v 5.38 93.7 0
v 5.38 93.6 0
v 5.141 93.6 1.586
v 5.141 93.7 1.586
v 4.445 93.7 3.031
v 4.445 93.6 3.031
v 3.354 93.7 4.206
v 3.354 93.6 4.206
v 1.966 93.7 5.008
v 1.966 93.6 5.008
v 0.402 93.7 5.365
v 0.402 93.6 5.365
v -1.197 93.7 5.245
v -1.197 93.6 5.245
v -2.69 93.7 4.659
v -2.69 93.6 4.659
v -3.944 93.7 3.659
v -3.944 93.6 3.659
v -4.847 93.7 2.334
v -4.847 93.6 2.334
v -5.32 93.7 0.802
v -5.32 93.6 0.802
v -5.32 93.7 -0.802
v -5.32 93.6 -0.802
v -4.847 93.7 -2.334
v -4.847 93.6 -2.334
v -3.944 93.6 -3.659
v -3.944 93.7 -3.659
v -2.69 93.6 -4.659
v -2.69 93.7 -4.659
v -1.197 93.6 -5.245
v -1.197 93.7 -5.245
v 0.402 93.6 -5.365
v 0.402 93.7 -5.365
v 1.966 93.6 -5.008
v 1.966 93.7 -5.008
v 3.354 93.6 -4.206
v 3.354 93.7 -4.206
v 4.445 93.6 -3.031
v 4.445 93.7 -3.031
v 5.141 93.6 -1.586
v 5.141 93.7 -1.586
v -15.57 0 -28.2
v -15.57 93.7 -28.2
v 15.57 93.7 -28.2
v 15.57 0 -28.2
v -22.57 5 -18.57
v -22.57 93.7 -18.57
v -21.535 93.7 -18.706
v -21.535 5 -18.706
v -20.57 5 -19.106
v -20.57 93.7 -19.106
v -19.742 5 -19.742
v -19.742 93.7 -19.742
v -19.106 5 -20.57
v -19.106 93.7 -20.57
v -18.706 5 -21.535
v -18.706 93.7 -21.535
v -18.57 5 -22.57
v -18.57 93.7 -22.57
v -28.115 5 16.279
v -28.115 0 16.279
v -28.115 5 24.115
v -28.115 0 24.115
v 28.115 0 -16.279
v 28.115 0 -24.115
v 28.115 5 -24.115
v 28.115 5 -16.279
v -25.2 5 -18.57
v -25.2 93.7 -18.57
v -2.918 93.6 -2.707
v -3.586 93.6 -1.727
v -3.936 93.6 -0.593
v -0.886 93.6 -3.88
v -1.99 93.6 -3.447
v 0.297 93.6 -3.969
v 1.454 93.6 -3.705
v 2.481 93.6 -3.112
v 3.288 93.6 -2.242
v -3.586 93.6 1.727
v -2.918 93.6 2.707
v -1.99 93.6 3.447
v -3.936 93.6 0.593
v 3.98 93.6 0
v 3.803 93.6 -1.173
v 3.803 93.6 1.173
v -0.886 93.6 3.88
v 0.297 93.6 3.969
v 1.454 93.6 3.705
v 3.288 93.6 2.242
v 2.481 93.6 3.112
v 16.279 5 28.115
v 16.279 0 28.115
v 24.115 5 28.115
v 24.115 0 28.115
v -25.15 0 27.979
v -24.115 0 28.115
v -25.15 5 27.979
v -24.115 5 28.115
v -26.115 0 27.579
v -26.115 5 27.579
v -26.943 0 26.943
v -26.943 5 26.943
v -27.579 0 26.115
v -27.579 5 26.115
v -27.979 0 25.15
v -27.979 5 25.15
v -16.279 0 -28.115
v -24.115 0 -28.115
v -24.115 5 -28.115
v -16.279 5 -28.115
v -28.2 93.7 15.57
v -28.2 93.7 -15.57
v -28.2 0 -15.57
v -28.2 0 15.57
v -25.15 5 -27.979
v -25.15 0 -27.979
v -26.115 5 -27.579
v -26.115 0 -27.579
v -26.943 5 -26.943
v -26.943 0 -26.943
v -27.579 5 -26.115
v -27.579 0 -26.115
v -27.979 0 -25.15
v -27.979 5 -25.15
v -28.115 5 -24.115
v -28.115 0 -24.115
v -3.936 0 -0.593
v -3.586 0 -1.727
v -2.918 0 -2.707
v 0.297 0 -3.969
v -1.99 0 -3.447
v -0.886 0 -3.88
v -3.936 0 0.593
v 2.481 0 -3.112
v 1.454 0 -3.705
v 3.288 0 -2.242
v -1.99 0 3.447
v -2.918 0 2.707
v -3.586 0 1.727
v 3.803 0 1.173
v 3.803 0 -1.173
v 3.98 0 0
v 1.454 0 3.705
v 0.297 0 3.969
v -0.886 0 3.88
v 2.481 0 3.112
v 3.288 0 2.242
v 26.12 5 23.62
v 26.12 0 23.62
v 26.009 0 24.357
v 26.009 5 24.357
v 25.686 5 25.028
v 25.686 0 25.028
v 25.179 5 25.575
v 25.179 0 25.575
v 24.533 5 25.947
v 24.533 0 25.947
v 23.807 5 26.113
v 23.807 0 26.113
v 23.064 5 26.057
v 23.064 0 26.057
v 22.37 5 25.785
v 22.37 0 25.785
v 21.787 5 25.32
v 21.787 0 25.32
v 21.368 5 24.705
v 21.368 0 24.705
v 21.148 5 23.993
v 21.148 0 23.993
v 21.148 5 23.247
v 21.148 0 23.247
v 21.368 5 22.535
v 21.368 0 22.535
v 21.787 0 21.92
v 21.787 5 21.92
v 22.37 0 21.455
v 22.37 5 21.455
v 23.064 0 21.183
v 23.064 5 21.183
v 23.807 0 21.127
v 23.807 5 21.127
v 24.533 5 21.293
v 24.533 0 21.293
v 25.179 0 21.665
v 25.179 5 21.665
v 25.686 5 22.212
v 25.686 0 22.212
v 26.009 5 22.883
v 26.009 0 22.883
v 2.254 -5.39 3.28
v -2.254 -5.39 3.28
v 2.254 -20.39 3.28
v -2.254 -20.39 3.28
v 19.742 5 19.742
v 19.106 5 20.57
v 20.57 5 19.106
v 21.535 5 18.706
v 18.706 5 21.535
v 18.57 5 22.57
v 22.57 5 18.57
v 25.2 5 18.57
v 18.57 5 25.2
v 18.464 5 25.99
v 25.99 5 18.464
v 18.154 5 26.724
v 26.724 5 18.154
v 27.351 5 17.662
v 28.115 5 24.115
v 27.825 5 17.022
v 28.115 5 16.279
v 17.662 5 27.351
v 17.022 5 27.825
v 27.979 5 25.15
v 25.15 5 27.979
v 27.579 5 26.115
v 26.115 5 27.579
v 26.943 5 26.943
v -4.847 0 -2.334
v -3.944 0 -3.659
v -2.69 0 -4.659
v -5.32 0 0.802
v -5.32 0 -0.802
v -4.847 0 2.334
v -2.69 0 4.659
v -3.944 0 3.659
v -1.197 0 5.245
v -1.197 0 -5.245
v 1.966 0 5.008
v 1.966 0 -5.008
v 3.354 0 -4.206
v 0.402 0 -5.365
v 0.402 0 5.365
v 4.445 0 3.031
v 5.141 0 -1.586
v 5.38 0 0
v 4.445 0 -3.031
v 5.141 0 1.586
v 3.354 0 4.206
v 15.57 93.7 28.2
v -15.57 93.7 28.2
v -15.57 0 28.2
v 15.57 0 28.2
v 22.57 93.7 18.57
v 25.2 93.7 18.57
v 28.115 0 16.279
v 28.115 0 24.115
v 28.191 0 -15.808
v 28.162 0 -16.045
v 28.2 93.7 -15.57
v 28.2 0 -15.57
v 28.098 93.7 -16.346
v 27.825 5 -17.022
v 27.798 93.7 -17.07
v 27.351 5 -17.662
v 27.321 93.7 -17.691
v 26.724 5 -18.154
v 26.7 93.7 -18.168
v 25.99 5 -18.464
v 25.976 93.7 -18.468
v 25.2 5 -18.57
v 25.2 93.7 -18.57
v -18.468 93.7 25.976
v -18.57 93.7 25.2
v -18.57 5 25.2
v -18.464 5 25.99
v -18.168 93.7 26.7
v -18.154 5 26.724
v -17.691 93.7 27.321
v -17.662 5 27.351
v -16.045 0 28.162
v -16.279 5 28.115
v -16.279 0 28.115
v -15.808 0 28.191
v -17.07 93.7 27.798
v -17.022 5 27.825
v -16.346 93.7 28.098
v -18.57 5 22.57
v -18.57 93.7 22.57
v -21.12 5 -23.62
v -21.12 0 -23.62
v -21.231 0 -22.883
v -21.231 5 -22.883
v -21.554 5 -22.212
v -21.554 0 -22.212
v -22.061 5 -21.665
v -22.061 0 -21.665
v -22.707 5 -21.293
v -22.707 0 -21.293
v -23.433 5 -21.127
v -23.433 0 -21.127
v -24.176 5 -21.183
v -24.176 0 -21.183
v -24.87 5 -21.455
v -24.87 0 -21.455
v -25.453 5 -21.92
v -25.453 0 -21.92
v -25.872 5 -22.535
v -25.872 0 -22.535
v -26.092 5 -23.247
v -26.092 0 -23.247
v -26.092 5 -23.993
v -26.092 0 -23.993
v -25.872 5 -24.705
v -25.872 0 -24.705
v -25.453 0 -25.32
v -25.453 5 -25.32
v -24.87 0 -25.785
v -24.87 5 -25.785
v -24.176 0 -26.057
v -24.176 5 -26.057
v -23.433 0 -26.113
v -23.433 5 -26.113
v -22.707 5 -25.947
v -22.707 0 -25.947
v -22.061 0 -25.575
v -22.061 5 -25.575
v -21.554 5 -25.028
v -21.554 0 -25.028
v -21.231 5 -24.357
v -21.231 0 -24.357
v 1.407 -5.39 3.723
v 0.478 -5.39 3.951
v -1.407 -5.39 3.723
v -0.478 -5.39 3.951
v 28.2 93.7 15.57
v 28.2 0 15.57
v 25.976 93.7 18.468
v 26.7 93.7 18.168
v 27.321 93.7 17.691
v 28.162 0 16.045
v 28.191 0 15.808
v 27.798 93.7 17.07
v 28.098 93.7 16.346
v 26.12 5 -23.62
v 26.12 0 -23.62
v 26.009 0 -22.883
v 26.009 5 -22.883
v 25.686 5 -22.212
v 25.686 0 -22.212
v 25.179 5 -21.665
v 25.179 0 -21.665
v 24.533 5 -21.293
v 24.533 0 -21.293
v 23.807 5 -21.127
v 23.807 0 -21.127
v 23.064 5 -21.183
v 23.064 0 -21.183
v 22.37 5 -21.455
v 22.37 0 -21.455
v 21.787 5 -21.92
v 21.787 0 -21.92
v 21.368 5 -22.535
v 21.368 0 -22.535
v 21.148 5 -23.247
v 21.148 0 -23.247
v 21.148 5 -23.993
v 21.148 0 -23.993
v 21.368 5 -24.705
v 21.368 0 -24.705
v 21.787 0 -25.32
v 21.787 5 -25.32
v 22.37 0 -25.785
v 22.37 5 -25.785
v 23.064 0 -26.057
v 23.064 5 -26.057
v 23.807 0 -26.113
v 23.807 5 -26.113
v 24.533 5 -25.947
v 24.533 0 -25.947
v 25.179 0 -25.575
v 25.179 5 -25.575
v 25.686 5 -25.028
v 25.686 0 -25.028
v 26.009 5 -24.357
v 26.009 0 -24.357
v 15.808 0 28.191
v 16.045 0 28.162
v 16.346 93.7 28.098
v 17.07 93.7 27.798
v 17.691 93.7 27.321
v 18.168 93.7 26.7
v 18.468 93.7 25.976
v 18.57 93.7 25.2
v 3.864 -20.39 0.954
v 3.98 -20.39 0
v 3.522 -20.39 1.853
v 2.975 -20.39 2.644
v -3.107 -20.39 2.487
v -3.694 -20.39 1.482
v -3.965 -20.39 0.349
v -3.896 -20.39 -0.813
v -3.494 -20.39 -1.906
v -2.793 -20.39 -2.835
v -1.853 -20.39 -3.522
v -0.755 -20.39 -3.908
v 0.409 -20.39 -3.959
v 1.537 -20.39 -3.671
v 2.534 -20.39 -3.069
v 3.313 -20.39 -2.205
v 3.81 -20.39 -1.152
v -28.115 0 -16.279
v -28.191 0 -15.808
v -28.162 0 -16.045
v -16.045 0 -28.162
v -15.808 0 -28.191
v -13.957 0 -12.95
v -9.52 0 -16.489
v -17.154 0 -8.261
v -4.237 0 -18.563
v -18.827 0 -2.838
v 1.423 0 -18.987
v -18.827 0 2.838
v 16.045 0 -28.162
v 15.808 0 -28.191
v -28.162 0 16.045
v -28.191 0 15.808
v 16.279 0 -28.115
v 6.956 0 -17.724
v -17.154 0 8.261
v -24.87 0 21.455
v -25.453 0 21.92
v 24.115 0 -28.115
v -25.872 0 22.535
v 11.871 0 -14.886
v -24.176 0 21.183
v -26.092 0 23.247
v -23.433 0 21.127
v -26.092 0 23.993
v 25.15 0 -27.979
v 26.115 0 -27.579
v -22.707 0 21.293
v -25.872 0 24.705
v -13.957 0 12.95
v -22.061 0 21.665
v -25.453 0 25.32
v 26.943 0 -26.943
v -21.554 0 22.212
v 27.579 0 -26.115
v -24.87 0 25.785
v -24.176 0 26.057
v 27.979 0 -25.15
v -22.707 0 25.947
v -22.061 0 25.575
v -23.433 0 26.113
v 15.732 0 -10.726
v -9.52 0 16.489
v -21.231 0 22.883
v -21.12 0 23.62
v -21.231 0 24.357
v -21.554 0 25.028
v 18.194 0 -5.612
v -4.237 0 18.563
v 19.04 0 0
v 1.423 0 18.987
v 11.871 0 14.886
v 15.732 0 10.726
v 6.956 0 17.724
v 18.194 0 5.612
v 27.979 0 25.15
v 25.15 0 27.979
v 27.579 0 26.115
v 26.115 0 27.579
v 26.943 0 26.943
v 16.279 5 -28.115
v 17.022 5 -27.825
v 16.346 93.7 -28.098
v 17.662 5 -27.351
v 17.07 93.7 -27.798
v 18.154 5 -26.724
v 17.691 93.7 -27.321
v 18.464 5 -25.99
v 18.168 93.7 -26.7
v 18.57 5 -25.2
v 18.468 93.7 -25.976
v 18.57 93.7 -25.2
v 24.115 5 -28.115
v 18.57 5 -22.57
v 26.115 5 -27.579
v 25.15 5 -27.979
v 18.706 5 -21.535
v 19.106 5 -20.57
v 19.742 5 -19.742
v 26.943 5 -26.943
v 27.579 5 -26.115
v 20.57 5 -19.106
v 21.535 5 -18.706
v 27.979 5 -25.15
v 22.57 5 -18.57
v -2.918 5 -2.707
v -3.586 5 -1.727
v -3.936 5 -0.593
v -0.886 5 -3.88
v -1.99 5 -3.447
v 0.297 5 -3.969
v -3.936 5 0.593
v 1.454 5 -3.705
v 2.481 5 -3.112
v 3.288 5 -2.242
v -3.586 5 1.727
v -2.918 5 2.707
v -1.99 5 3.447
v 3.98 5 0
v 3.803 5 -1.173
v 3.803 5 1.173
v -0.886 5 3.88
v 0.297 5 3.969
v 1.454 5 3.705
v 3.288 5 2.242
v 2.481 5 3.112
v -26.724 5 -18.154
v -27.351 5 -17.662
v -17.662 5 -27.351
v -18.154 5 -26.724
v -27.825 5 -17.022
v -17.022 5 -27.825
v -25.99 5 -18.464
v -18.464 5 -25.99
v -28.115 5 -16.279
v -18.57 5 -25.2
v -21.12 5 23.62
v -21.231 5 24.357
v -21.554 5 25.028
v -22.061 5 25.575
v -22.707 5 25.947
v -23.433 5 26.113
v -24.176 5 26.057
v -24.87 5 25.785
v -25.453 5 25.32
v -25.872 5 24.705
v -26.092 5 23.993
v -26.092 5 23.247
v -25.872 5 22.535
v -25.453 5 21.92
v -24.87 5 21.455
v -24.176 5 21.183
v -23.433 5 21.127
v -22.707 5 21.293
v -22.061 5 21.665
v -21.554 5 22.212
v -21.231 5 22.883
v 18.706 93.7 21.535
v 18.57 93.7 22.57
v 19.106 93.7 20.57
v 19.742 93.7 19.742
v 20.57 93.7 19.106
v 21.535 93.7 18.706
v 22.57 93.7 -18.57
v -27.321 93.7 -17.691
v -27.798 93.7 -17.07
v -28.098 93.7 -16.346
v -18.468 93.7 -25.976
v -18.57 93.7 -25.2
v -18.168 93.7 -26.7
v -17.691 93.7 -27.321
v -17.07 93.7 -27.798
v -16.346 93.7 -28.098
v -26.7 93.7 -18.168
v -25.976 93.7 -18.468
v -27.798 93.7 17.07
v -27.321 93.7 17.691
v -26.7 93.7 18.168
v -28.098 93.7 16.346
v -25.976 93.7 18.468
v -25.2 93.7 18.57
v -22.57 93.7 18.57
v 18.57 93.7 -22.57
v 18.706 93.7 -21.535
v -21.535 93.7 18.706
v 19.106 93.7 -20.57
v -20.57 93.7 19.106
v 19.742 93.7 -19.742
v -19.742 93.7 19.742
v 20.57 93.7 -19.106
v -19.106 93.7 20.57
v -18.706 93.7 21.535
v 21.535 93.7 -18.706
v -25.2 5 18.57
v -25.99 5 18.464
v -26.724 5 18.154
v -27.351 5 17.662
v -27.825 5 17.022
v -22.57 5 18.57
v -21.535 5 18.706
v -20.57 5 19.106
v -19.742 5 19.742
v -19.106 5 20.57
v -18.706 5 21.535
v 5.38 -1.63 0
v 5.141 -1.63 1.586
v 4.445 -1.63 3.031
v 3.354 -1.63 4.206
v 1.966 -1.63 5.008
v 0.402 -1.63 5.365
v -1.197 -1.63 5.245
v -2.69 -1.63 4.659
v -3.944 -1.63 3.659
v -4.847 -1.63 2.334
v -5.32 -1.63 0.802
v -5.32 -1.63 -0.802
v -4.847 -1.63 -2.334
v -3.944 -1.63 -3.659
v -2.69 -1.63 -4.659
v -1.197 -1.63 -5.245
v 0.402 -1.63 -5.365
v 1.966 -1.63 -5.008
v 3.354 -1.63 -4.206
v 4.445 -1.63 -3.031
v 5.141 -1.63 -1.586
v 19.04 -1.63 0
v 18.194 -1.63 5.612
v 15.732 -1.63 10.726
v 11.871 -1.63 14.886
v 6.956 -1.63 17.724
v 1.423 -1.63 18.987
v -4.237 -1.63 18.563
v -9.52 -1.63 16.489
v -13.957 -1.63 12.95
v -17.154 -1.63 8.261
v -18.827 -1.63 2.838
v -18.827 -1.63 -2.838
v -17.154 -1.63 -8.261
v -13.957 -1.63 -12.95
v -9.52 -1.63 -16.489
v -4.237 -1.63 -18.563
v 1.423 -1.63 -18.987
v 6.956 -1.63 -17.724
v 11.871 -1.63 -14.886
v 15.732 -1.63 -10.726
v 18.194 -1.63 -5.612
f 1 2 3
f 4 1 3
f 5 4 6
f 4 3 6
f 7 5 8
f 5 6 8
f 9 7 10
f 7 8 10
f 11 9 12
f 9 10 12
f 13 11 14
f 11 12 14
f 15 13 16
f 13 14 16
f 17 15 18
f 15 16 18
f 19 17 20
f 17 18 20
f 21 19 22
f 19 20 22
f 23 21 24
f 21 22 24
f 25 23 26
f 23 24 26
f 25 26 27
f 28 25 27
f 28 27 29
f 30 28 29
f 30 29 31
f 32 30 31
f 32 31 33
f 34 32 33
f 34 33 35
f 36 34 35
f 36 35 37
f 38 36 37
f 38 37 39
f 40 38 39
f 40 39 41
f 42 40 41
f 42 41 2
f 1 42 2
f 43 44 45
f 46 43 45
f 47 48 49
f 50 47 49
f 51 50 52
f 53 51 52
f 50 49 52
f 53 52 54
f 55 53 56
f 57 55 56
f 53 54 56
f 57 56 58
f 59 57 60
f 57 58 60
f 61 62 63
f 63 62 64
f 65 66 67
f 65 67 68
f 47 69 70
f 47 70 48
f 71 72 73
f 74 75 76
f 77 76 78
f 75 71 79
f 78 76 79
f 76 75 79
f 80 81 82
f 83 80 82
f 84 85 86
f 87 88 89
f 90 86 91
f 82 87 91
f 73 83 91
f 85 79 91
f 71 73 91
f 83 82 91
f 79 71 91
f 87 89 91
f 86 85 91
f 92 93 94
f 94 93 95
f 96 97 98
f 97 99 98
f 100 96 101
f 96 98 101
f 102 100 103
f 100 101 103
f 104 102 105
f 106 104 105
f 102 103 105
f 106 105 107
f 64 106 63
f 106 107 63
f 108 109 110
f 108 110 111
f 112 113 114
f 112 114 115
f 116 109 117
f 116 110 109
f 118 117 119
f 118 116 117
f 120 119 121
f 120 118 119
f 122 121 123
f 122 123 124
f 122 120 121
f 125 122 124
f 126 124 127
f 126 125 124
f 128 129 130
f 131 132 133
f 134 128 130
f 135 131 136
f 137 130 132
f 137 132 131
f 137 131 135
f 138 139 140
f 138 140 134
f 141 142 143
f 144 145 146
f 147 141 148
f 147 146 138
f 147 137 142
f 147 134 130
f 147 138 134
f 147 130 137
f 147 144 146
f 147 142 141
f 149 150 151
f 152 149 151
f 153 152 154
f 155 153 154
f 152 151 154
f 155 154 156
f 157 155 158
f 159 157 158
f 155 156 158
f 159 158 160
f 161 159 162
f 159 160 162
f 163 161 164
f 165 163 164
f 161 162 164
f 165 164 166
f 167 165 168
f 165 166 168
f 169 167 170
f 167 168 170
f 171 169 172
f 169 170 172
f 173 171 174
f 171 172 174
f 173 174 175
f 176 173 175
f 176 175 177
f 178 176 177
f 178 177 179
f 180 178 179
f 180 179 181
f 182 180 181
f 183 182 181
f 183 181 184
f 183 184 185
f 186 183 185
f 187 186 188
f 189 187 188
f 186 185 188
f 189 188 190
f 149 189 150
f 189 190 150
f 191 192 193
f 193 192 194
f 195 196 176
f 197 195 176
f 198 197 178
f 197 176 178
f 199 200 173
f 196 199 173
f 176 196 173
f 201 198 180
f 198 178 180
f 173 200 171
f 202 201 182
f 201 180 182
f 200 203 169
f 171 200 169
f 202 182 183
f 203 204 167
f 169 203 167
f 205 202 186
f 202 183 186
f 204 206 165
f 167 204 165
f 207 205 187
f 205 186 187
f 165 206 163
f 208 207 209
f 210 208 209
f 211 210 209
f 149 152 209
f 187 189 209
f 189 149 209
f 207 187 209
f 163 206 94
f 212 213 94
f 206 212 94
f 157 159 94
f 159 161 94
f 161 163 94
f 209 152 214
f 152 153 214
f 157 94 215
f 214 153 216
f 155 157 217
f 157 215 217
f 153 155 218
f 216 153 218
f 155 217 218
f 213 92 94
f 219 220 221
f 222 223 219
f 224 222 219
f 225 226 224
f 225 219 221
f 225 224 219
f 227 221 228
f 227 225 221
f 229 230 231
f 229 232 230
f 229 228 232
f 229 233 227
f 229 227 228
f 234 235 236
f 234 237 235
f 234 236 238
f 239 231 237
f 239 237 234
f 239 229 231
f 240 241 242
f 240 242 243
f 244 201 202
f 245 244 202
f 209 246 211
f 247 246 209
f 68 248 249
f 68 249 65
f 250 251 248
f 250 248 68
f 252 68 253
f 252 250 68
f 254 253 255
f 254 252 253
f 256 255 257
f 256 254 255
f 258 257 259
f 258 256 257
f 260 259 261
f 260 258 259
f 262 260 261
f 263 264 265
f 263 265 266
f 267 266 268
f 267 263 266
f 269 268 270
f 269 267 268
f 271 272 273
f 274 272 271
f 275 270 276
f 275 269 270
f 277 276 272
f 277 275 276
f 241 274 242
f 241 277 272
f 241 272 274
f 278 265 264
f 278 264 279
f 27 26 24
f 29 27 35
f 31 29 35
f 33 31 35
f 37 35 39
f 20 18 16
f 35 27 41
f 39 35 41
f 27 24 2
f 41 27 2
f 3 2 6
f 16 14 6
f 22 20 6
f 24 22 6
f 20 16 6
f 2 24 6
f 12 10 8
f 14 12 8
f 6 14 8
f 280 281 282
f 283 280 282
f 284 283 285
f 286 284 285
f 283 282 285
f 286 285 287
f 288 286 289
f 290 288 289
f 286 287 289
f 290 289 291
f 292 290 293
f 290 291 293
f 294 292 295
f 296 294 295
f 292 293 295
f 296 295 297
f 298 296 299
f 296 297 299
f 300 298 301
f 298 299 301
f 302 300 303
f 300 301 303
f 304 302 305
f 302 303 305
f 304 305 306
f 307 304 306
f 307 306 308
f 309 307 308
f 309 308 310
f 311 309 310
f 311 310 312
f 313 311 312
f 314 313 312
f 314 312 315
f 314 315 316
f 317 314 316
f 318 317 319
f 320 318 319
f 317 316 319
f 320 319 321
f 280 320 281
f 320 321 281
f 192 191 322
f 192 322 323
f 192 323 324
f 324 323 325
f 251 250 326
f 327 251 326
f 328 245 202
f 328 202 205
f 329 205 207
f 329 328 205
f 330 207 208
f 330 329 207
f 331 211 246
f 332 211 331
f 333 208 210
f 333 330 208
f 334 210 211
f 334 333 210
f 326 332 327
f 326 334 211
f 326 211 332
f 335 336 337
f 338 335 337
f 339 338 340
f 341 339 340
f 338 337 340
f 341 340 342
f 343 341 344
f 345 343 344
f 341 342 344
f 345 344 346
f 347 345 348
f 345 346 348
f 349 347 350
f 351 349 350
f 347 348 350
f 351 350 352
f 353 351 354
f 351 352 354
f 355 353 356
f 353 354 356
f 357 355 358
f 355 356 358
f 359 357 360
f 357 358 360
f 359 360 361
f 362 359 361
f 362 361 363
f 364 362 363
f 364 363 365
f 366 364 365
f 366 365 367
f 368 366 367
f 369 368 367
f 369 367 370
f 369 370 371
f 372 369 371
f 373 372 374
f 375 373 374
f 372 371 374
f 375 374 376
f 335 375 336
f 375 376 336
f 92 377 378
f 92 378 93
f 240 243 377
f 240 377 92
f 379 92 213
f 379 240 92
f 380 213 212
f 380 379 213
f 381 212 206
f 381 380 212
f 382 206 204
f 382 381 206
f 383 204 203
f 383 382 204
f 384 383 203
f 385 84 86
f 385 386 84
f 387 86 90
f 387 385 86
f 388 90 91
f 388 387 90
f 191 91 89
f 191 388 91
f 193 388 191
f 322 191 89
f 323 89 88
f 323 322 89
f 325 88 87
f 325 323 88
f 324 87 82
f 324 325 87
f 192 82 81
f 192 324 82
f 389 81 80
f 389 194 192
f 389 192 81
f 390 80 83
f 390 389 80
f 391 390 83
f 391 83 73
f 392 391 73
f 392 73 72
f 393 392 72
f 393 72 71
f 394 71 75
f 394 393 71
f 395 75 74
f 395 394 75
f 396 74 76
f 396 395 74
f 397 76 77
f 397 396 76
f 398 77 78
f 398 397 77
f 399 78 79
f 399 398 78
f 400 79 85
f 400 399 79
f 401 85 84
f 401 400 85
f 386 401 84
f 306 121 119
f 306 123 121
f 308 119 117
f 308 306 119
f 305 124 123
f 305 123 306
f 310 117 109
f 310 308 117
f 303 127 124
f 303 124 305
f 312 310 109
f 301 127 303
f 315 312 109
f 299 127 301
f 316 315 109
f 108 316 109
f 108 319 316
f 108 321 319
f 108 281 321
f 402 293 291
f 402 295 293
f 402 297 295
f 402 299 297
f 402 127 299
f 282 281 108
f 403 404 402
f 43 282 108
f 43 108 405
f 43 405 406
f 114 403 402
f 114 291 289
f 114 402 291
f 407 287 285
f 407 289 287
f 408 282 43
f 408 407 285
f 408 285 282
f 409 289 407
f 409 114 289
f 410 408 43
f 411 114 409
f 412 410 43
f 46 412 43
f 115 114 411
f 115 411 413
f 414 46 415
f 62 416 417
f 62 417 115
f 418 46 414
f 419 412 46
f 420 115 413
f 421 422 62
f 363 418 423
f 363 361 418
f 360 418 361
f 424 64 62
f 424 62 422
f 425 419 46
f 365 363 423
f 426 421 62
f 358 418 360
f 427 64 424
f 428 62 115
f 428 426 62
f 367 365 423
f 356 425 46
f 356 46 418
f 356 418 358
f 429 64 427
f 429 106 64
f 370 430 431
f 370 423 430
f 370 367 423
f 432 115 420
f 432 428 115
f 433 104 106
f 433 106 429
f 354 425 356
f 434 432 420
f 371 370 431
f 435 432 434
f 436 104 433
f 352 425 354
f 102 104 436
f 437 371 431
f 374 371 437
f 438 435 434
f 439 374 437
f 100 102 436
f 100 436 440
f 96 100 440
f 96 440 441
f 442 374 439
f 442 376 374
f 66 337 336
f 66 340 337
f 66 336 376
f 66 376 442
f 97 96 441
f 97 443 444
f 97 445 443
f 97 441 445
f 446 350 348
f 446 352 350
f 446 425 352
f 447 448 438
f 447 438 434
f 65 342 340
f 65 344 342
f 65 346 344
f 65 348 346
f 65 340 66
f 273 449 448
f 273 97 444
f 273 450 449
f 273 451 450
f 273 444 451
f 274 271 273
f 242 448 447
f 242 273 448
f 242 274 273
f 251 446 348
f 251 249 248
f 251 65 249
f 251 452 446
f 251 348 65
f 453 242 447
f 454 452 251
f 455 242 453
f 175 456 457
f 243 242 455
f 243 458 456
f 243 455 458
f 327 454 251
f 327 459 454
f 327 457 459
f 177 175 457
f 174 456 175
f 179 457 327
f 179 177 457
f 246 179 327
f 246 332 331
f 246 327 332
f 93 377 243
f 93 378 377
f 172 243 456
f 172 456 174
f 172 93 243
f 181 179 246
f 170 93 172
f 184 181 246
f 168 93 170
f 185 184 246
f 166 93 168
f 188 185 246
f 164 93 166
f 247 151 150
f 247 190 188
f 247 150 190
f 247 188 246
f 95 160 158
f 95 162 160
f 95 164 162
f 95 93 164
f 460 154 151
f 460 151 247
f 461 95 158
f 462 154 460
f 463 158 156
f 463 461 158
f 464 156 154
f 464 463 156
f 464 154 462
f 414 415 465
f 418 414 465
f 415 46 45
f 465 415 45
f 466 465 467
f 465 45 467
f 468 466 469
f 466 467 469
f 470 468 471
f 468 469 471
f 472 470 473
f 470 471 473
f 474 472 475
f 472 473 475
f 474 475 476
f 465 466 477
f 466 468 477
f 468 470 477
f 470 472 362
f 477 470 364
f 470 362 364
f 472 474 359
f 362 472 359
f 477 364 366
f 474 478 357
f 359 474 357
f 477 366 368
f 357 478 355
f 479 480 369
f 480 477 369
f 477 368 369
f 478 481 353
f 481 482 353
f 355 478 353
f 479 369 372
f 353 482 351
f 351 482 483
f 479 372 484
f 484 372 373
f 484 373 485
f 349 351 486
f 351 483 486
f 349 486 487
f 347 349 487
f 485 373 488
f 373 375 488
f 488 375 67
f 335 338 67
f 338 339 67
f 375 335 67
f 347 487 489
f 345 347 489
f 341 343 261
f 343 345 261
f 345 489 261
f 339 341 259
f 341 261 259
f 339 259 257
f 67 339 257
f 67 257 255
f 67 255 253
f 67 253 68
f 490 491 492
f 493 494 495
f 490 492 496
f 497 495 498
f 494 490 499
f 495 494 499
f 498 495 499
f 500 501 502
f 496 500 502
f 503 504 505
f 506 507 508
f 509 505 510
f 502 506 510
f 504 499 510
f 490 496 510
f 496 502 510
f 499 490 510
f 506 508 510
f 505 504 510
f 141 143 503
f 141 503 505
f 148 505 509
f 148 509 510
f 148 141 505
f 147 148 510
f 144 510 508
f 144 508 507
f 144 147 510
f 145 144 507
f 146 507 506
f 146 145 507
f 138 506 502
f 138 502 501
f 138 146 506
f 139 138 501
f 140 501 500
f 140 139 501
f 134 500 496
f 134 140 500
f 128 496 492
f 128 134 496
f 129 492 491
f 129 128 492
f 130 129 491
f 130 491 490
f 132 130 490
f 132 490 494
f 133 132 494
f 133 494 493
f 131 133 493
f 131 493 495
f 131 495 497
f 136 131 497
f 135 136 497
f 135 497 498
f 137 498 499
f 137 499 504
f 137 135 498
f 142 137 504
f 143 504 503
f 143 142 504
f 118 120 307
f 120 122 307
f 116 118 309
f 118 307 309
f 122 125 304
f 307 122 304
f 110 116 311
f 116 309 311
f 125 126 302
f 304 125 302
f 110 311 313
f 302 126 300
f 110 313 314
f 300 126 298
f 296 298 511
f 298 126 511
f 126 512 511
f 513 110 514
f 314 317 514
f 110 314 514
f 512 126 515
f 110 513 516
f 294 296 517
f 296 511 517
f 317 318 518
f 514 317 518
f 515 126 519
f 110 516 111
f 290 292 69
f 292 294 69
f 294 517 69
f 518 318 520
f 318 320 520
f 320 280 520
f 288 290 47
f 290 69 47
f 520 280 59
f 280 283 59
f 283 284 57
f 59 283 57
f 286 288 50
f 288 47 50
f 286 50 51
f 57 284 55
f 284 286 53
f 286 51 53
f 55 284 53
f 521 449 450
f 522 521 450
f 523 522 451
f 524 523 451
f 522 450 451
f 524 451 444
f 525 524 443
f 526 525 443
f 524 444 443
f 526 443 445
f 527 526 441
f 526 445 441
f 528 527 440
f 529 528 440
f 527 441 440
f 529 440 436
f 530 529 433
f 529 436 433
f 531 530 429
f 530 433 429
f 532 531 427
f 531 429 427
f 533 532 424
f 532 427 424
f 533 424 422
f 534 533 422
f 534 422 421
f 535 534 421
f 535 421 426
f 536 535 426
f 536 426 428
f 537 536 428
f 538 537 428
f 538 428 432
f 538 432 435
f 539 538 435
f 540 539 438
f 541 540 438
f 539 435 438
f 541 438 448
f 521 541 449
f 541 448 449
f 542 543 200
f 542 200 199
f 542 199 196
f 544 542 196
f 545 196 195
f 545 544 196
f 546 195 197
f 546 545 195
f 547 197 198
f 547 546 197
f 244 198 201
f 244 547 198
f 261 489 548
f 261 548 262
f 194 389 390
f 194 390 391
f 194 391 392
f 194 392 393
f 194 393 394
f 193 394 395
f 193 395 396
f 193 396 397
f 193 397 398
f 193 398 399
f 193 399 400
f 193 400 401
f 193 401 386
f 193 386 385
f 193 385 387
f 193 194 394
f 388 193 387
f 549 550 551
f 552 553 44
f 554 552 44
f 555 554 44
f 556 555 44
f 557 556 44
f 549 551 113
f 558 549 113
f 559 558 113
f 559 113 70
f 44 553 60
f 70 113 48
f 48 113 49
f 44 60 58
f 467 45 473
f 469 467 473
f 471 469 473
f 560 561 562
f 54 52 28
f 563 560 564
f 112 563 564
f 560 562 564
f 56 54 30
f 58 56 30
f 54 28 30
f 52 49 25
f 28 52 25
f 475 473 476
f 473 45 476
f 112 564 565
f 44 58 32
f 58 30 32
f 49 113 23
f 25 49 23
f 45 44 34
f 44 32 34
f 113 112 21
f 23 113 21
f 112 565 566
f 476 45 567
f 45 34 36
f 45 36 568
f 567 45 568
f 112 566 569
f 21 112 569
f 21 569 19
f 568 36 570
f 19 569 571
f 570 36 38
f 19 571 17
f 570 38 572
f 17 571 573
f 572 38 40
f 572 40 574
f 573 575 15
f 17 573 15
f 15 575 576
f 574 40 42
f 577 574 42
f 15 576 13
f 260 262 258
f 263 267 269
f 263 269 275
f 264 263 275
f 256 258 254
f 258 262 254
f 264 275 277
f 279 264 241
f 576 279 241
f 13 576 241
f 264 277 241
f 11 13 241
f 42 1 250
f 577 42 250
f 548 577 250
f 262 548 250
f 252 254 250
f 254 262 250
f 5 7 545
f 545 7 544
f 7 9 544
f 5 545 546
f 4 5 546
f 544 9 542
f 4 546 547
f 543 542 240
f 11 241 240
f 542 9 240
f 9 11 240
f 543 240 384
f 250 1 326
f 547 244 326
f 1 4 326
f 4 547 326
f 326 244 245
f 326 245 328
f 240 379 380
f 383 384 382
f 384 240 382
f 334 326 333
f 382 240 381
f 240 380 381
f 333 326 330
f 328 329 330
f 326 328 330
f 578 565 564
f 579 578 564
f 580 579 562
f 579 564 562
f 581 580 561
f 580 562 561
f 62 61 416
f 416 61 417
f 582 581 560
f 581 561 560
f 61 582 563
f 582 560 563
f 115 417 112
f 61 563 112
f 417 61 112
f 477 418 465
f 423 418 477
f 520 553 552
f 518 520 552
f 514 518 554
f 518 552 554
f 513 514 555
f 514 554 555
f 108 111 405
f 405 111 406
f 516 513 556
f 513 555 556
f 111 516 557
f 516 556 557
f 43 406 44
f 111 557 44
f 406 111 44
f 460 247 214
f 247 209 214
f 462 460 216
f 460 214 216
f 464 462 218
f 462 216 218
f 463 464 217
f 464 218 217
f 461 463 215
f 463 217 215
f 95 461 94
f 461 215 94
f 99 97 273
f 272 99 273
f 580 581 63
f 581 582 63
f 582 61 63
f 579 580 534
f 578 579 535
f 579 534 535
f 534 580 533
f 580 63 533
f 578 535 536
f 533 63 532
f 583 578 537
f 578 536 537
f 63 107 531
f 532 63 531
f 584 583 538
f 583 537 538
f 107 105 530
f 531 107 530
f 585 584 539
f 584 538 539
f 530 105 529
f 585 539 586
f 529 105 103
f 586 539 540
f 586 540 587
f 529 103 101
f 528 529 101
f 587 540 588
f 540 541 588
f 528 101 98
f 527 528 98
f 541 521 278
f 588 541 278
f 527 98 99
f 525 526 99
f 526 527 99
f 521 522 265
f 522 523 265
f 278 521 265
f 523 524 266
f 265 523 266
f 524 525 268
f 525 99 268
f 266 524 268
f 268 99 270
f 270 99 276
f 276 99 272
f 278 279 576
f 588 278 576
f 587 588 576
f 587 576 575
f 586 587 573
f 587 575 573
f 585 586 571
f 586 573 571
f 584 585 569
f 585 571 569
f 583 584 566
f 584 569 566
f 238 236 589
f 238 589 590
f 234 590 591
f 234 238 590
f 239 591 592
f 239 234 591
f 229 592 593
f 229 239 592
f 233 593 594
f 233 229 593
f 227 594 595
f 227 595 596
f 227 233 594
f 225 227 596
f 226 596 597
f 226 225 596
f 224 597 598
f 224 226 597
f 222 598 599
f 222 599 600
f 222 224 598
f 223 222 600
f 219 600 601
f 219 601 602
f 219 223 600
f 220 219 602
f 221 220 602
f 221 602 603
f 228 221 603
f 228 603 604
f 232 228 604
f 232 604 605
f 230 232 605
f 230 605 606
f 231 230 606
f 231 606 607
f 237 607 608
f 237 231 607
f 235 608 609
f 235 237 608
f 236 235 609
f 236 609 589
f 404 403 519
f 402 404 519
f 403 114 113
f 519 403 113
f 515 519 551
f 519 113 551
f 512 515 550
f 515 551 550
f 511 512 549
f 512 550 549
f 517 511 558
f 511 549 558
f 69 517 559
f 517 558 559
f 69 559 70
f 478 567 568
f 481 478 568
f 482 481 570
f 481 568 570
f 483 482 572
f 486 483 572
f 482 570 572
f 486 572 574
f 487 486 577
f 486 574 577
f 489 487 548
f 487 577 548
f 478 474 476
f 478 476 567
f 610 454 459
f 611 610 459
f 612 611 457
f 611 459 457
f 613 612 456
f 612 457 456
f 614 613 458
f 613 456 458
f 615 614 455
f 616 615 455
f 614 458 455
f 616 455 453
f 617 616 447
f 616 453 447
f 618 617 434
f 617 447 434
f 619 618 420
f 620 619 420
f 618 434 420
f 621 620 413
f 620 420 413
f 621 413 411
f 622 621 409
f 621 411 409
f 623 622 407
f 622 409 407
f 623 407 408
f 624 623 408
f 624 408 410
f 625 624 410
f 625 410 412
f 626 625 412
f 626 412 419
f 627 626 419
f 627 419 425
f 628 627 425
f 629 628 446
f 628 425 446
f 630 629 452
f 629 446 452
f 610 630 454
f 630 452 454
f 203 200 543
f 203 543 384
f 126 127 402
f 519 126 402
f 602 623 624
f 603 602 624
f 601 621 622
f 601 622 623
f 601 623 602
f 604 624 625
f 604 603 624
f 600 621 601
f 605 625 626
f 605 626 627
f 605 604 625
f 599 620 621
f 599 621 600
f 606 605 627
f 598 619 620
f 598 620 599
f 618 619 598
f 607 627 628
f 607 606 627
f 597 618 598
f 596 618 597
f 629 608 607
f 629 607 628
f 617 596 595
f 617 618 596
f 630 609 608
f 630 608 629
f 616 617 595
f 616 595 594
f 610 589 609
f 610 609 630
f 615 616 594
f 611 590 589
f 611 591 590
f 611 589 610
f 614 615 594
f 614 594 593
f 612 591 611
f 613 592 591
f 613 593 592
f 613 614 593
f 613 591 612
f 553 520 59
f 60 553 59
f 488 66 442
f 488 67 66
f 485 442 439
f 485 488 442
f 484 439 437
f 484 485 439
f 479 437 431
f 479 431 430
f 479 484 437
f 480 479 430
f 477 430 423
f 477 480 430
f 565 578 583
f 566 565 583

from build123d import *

# Parameters (mm, degrees)
F0_W          = 56.23
F0_H          = 56.23
F0_R          = 2.5
F0_R_2        = 19.04
F0_R_3        = 5.38
F1_DEPTH      = 5
F0_R_4        = 3.98
F2_DEPTH      = 1.63
F3_R          = 4
F4_W          = 37.14
F4_H          = 9.63
F4_H_2        = 37.14
F4_W_2        = 9.63
F5_DEPTH      = 98.9
F6_R          = 4
F7_R          = 3
F8_DEPTH      = 20.39
F8_DEPTH_BACK = 94.9
F9_W          = 15
F9_H          = 0.7
F10_DEPTH     = 56.316
F11_START     = -93.6
F5_FACE_R     = 5.38
F11_DEPTH     = 5.3
F12_DEPTH     = 5.2
F13_R         = 0.1742671658
F14_DEPTH     = 0.5
F14_TAPER     = -3


with BuildPart() as f1:
    # F0 (on Front) → F1 (new body)
    with BuildSketch(Plane.XZ):
        Rectangle(F0_W, F0_H)
        with Locations((-23.62, -23.62)):
            Circle(F0_R, mode=Mode.SUBTRACT)
        with Locations((23.62, -23.62)):
            Circle(F0_R, mode=Mode.SUBTRACT)
        with Locations((-23.62, 23.62)):
            Circle(F0_R, mode=Mode.SUBTRACT)
        Circle(F0_R_2, mode=Mode.SUBTRACT)
        with Locations((23.62, 23.62)):
            Circle(F0_R, mode=Mode.SUBTRACT)
        Circle(F0_R_2)
        Circle(F0_R_3, mode=Mode.SUBTRACT)
    extrude(amount=-F1_DEPTH)

    # F0 (on Front) → F2 (join)
    with BuildSketch(Plane.XZ):
        Circle(F0_R_2)
        Circle(F0_R_3, mode=Mode.SUBTRACT)
    extrude(amount=F2_DEPTH)

    # F3
    f3_edges = [f1.edges().sort_by_distance(p)[0] for p in [
        (-28.115, 2.5, 28.115),
        (28.115, 2.5, 28.115),
        (28.115, 2.5, -28.115),
        (-28.115, 2.5, -28.115),
    ]]
    fillet(f3_edges, radius=F3_R)

    # F4 (on Front) → F5 (join)
    with BuildSketch(Plane.XZ):
        with Locations((0, 23.385)):
            Rectangle(F4_W, F4_H)
        Rectangle(F4_W, F4_H_2)
        with Locations((-23.385, 0)):
            Rectangle(F4_W_2, F4_H_2)
        with Locations((23.385, 0)):
            Rectangle(F4_W_2, F4_H_2)
        with Locations((0, -23.385)):
            Rectangle(F4_W, F4_H)
    extrude(amount=-F5_DEPTH)

    # F6
    f6_edges = [f1.edges().sort_by_distance(p)[0] for p in [
        (18.57, 51.95, 18.57),
        (-18.57, 51.95, 18.57),
        (-18.57, 51.95, -18.57),
        (18.57, 51.95, -18.57),
    ]]
    fillet(f6_edges, radius=F6_R)

    # F7
    f7_edges = [f1.edges().sort_by_distance(p)[0] for p in [
        (18.57, 49.45, 28.2),
        (28.2, 49.45, 18.57),
        (28.2, 49.45, -18.57),
        (18.57, 49.45, -28.2),
        (-18.57, 49.45, -28.2),
        (-28.2, 49.45, -18.57),
        (-28.2, 49.45, 18.57),
        (-18.57, 49.45, 28.2),
    ]]
    fillet(f7_edges, radius=F7_R)


with BuildPart() as f1b:
    # F0 (on Front) → F1, piece 2 (new body)
    with BuildSketch(Plane.XZ):
        Circle(F0_R_4)
    extrude(amount=-F1_DEPTH)


with BuildPart() as f8:
    # F0 (on Front) → F8 (new body, two sides)
    with BuildSketch(Plane.XZ) as f8_sk:
        Circle(F0_R_4)
    extrude(amount=F8_DEPTH)
    extrude(f8_sk.sketch, amount=-F8_DEPTH_BACK)

    # F9 (on face) → F10 (cut, through all)
    with BuildSketch(Plane(origin=(-28.115, 0, 0), x_dir=(0, -1, 0), z_dir=(-1, 0, 0))):
        with Locations((12.89, 3.63)):
            Rectangle(F9_W, F9_H)
    extrude(amount=-F10_DEPTH, mode=Mode.SUBTRACT)


with BuildPart() as f11_tool:
    # F5_face (on face) → F11 (new body)
    with BuildSketch(Plane.XZ.offset(F11_START)):
        Circle(F5_FACE_R)
    extrude(amount=-F11_DEPTH)


with BuildPart() as f1_1:
    add(f1.part)

    # F11: cut by f11_tool
    add(f11_tool.part, mode=Mode.SUBTRACT)

    # F12 (cut): a face of the model
    f12_faces = [f1_1.faces().sort_by_distance(p)[0] for p in [
        (-17.7723835508, 98.9, 23.885),
    ]]
    extrude(f12_faces, amount=-F12_DEPTH, mode=Mode.SUBTRACT)

    # F13 (on face) → F14 (cut)
    with BuildSketch(Plane.XZ.offset(20.39)):
        Circle(F13_R)
    extrude(amount=F14_DEPTH, taper=F14_TAPER, mode=Mode.SUBTRACT)


with BuildPart() as f8_1:
    add(f8.part)

    # F11: cut by f11_tool
    add(f11_tool.part, mode=Mode.SUBTRACT)


solid = Compound([f1b.part, f1_1.part, f8_1.part])
